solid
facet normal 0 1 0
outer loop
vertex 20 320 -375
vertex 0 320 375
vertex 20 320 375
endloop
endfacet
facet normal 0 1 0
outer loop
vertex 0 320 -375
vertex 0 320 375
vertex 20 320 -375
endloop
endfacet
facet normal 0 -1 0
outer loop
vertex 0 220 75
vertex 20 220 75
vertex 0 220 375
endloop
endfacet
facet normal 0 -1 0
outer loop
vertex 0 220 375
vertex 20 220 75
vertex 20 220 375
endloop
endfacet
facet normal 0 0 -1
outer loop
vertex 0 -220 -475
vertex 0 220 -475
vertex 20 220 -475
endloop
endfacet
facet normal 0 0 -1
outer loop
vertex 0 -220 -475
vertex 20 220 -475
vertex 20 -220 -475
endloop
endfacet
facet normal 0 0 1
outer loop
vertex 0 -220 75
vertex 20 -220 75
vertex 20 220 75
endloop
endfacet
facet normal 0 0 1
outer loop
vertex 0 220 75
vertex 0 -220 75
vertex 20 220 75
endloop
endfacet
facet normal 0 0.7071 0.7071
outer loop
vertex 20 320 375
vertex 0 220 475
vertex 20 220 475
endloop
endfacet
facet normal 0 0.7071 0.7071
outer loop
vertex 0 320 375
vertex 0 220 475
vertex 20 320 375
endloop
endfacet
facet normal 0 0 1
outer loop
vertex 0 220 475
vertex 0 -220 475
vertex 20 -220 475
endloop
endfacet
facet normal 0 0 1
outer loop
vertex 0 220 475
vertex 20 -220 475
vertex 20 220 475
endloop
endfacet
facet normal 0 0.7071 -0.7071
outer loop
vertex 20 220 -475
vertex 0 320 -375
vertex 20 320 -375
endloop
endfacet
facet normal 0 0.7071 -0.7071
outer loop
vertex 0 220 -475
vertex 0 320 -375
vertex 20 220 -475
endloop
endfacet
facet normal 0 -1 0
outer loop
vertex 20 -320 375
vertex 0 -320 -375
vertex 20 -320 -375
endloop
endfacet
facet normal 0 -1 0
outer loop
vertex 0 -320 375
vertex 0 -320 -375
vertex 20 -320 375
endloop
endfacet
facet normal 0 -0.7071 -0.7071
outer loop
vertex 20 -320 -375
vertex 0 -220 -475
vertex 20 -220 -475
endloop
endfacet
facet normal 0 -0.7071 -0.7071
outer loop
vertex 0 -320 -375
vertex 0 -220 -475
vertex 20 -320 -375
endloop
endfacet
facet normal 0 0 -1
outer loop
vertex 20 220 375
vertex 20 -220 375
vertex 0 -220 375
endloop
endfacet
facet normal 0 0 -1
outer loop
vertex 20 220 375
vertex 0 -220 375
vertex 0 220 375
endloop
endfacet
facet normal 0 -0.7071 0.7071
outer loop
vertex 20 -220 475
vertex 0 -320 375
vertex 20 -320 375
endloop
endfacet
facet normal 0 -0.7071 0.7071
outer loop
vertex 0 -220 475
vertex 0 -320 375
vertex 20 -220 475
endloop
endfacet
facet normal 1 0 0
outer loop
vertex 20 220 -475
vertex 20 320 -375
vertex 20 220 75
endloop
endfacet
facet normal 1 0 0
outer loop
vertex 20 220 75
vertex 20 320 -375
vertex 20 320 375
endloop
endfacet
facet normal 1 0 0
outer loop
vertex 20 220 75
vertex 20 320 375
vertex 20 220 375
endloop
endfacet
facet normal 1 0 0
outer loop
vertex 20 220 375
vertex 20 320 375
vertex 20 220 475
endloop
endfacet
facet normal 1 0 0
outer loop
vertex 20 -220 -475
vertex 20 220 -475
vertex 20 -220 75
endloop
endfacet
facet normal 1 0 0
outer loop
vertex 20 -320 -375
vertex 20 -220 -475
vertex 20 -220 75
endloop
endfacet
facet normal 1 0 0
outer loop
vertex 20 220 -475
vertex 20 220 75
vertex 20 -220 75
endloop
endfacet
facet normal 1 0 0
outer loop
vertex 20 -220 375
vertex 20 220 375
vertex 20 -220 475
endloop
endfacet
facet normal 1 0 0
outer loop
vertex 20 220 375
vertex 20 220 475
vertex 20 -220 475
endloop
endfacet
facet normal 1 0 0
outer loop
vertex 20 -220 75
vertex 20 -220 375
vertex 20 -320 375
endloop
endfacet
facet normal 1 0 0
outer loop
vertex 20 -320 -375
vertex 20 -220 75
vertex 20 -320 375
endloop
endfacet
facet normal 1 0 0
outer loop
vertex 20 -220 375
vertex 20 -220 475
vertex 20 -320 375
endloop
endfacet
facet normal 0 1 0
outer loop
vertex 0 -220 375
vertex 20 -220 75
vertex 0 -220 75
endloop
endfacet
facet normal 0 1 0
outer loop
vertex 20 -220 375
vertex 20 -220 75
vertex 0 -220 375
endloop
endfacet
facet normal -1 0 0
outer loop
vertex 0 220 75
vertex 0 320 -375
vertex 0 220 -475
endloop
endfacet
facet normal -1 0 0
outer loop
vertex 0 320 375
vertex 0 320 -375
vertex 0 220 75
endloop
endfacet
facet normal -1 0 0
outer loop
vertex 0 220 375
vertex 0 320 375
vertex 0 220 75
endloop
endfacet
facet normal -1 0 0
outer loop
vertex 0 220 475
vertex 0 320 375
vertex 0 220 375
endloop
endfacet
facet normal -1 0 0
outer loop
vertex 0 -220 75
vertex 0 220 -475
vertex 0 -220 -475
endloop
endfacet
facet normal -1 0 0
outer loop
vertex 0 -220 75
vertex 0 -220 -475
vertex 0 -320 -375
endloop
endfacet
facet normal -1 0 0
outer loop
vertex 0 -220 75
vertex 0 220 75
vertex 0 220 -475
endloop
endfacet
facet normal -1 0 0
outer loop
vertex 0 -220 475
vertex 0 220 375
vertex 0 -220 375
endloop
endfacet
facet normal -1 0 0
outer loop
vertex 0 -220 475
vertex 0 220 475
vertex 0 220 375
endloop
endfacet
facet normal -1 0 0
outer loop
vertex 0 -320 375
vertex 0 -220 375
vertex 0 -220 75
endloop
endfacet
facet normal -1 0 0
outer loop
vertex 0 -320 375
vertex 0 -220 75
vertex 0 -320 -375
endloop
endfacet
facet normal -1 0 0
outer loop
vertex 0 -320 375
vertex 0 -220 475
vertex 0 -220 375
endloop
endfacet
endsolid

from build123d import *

# Parameters (mm, degrees)
PAD_DEPTH    = 20
SKETCH001_W  = 440
SKETCH001_H  = 300
POCKET_DEPTH = 20


with BuildPart() as part:
    # Sketch → Pad (new body)
    with BuildSketch(Plane.YZ):
        Polygon((-220, 475), (220, 475), (320, 375), (320, -375), (220, -475), (-220, -475), (-320, -375), (-320, 375), align=None)
    extrude(amount=PAD_DEPTH)

    # Sketch001 (on Face10 of Pad) → Pocket (cut)
    with BuildSketch(Plane.YZ.offset(20)):
        with Locations((0, 225)):
            Rectangle(SKETCH001_W, SKETCH001_H)
    extrude(amount=-POCKET_DEPTH, mode=Mode.SUBTRACT)


solid = part.part
